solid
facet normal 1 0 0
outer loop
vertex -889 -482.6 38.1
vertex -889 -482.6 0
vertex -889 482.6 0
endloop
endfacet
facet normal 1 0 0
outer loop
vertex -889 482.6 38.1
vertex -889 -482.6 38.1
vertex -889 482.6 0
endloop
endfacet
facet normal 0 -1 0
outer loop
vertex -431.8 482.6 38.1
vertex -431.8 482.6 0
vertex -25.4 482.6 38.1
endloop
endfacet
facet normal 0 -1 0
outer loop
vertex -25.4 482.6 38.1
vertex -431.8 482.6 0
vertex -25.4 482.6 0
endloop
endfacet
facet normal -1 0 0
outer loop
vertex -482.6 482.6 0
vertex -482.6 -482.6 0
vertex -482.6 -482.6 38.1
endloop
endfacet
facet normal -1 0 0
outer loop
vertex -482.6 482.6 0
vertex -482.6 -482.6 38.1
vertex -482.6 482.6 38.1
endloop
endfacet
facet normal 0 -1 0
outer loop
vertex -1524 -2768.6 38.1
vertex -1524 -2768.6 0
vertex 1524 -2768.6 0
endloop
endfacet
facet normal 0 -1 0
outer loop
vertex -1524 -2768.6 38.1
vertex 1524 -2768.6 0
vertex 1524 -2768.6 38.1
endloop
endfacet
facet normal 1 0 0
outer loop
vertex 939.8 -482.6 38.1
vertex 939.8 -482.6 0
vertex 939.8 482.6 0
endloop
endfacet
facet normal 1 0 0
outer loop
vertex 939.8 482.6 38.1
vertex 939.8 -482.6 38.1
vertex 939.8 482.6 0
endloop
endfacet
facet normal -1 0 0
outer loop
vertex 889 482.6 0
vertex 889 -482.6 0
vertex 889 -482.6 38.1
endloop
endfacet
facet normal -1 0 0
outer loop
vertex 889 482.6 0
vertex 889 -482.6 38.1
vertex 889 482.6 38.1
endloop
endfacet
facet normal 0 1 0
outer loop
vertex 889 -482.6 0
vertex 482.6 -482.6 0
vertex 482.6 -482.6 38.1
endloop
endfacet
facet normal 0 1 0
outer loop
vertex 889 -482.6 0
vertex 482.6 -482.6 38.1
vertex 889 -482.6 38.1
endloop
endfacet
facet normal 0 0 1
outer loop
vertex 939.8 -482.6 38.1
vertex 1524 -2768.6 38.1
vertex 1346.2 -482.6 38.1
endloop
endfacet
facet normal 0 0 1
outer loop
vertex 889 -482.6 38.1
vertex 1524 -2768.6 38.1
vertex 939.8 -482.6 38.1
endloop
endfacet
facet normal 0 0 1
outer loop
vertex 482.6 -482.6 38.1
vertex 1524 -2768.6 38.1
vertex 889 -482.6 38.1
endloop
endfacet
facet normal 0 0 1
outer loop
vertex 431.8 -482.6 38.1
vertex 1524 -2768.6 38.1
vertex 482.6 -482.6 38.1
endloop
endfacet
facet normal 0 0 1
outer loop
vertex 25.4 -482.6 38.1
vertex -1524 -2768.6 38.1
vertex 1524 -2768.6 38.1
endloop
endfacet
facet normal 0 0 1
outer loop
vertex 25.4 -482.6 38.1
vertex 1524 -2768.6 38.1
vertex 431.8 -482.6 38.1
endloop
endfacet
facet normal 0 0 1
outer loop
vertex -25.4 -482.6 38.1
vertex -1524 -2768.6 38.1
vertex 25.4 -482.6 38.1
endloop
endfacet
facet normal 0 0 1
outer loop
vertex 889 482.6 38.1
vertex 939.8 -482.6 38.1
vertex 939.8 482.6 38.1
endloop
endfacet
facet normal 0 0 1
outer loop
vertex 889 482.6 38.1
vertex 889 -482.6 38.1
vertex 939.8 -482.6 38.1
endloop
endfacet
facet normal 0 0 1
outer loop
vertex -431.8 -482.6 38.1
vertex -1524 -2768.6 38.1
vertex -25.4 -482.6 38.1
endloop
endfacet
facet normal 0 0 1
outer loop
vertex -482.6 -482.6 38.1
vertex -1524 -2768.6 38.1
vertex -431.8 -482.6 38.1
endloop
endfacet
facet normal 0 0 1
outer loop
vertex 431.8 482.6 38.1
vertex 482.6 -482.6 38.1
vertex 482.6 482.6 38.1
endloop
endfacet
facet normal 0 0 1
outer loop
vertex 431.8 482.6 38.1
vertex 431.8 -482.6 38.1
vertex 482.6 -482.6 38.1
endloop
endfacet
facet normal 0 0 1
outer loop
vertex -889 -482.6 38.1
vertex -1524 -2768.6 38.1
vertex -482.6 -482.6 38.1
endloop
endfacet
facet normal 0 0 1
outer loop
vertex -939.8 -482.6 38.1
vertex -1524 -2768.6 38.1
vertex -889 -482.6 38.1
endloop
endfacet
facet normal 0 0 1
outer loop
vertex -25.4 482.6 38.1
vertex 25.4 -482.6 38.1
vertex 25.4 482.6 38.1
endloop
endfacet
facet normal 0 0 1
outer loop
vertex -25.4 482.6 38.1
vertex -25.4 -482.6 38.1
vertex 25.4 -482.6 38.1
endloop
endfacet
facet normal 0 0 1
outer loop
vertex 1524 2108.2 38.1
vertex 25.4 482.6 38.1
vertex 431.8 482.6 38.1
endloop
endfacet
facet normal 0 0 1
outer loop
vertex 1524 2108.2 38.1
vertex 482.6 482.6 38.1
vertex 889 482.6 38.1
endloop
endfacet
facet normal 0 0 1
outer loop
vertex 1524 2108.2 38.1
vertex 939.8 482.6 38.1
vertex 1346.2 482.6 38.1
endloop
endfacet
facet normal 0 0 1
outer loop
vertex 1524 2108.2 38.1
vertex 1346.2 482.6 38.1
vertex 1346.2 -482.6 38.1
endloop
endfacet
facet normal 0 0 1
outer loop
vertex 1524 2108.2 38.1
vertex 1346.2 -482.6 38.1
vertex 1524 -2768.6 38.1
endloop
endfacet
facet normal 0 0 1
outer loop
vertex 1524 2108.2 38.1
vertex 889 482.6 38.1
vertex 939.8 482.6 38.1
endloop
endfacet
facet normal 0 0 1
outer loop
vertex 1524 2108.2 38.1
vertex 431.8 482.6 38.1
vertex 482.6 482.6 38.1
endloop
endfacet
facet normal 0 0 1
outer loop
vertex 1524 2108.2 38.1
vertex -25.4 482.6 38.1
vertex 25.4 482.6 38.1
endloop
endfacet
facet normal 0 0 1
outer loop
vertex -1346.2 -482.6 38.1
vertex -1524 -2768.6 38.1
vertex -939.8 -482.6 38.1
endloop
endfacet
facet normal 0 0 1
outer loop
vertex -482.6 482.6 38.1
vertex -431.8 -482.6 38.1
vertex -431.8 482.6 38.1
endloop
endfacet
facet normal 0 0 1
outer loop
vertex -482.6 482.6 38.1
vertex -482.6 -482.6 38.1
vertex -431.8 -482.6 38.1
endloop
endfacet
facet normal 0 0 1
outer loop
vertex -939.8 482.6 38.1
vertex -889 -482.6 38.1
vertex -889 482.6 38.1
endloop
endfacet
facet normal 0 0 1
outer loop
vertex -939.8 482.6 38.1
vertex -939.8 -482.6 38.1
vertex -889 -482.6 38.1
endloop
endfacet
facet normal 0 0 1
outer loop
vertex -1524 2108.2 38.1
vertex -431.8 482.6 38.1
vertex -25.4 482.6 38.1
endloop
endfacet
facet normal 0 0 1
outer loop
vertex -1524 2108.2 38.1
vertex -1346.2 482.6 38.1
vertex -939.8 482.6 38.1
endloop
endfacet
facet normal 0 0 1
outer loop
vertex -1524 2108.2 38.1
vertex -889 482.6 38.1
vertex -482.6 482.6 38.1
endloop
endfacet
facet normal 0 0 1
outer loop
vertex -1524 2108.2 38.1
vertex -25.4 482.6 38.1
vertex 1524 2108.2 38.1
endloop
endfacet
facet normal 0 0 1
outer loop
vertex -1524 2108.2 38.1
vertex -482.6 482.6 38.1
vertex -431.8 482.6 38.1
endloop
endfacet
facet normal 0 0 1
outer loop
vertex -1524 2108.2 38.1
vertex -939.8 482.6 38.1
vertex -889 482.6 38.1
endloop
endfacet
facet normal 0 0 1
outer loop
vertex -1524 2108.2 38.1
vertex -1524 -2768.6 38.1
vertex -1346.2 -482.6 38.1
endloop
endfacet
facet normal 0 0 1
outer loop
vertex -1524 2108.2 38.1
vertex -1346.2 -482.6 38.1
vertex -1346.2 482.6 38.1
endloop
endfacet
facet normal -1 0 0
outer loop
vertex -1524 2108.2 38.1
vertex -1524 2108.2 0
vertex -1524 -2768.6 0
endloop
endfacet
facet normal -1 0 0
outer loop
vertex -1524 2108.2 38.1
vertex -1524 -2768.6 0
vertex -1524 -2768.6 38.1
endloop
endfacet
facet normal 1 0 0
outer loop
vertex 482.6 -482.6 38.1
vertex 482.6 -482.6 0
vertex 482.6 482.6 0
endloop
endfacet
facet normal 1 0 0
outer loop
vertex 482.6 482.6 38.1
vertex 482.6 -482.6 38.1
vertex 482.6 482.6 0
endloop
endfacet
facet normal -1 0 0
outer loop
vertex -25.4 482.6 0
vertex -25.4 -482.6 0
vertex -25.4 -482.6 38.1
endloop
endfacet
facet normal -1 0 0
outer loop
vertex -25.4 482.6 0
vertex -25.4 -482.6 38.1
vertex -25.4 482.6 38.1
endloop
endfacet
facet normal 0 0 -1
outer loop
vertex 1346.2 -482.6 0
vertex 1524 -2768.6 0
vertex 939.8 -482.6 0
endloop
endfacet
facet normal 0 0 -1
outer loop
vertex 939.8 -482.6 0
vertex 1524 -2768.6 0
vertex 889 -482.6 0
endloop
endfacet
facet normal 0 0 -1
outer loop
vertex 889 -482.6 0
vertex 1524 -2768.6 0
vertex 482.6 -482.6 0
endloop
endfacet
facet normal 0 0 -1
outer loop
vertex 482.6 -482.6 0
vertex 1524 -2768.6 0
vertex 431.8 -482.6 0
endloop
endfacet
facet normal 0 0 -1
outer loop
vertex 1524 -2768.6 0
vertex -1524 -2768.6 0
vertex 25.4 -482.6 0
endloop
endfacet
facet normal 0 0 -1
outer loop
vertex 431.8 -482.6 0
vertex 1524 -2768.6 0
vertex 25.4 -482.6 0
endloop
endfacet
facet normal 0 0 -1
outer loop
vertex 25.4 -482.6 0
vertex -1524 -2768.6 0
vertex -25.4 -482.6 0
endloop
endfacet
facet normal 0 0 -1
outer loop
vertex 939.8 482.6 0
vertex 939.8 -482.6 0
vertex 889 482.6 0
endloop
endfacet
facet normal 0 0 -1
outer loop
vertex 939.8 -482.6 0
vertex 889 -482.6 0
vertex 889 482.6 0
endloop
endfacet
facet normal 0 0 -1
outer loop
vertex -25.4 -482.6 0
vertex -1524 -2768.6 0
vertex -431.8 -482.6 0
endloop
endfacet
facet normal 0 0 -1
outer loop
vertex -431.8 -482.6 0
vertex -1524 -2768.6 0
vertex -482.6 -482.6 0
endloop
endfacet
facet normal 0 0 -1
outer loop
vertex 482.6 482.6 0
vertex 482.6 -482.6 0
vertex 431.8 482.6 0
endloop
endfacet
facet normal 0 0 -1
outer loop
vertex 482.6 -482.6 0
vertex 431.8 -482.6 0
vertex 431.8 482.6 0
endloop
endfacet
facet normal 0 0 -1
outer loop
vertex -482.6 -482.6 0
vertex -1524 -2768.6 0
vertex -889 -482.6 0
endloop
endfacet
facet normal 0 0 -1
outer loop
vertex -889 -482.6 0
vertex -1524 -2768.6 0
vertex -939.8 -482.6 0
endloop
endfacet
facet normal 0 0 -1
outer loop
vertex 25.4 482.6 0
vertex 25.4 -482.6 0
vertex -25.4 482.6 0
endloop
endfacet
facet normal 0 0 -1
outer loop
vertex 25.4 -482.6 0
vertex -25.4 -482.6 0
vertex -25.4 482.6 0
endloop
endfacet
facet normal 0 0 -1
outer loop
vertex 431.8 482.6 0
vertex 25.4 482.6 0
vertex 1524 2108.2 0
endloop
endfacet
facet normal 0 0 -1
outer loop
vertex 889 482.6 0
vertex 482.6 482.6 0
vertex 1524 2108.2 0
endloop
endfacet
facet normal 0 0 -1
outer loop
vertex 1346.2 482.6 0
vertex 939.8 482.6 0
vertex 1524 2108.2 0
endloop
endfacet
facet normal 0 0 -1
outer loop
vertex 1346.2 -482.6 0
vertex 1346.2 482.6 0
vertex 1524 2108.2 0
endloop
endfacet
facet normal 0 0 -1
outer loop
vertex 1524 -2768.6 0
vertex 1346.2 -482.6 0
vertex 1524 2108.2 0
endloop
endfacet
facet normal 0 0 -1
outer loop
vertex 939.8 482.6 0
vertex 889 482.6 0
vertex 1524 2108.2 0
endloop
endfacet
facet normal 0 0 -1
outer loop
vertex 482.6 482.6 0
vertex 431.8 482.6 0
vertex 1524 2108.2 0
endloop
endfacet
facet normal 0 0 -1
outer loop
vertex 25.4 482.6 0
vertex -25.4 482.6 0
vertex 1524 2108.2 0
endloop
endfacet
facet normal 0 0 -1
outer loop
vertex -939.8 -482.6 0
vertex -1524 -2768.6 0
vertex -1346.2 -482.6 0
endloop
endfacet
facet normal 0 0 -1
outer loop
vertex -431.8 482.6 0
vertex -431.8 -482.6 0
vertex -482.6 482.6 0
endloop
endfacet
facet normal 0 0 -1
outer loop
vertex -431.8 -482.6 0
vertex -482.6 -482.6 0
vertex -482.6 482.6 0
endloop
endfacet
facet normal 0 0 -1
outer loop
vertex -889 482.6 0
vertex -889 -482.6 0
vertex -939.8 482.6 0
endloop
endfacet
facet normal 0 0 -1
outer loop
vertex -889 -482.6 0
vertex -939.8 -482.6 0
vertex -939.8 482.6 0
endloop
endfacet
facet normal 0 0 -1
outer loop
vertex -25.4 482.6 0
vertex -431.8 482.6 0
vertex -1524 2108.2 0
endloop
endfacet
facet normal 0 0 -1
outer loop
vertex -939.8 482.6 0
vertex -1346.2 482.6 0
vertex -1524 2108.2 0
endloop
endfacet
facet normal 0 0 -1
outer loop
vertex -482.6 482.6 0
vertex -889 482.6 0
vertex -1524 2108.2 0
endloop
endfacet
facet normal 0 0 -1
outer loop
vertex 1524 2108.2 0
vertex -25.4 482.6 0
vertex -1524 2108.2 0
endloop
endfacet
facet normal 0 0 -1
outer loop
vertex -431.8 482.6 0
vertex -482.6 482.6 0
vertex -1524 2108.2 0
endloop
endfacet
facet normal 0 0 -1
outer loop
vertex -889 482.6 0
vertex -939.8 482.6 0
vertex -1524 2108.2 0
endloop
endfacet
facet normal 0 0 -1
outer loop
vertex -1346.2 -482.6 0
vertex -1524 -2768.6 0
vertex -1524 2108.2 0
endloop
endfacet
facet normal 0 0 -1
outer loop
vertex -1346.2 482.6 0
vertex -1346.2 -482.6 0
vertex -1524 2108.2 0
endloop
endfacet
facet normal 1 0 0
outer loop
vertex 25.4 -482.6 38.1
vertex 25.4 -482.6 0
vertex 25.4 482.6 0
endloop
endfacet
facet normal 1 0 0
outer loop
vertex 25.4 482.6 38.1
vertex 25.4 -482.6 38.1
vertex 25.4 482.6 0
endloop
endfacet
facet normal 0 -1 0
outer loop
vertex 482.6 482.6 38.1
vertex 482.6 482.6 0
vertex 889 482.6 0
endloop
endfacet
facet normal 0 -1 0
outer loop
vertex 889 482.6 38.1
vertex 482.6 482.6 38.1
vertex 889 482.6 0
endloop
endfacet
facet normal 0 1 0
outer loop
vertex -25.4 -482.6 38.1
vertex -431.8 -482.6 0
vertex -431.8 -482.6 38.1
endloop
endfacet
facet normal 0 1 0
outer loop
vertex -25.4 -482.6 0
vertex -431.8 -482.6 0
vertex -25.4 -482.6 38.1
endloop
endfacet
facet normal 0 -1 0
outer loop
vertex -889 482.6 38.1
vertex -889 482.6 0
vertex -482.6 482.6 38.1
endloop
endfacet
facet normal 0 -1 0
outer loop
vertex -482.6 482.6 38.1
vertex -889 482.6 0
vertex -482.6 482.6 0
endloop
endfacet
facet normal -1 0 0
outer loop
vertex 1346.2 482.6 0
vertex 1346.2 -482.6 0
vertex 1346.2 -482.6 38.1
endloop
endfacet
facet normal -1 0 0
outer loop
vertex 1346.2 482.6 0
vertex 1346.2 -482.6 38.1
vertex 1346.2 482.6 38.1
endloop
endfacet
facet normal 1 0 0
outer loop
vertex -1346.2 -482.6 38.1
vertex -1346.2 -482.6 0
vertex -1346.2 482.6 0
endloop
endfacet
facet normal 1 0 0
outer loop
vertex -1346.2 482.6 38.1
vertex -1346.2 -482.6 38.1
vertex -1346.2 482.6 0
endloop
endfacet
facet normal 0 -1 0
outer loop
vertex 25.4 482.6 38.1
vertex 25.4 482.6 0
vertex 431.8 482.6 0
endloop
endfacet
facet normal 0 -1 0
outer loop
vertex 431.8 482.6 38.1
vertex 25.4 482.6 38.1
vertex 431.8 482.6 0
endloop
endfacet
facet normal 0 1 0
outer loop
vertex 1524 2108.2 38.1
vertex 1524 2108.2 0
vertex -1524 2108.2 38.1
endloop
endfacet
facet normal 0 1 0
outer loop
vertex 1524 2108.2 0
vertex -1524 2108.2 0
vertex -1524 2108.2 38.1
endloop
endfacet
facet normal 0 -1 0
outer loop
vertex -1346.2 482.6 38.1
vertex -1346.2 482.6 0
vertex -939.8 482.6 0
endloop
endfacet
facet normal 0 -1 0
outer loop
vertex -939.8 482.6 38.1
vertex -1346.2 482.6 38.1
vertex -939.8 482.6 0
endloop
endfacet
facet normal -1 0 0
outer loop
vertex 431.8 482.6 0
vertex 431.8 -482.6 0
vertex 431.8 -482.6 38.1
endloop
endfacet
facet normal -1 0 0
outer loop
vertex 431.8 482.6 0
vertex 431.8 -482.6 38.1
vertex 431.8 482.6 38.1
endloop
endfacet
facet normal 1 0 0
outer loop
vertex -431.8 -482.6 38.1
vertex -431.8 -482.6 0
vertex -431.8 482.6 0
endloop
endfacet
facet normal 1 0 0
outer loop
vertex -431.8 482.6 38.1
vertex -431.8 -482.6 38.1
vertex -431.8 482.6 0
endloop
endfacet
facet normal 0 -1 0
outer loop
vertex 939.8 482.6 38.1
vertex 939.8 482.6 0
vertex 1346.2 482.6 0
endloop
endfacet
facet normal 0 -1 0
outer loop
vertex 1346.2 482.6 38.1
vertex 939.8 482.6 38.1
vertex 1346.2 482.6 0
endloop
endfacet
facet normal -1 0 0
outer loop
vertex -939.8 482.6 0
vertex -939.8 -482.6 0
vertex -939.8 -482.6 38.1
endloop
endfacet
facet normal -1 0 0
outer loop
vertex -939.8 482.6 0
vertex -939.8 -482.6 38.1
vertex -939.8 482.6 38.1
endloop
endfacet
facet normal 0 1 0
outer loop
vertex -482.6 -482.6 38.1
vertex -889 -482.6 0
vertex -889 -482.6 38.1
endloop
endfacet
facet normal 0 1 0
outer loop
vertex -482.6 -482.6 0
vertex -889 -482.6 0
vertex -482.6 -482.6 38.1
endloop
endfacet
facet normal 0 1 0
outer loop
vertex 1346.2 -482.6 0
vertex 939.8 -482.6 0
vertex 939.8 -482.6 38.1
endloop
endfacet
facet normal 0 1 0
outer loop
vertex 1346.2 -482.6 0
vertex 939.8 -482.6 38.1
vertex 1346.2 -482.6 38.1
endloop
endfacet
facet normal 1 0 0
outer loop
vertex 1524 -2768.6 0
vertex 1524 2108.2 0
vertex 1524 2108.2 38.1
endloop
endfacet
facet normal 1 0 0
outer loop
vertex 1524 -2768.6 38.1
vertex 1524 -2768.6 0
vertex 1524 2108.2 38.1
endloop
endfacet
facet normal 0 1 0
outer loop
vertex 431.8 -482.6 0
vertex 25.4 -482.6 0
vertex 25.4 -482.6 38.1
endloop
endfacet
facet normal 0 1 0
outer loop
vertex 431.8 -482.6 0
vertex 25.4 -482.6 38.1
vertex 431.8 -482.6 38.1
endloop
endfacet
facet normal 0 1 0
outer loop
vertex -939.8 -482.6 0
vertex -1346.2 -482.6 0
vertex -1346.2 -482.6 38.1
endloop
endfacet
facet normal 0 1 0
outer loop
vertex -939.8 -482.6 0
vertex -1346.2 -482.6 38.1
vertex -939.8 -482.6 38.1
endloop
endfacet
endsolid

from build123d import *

# Parameters (mm, degrees)
SKETCH1_W               = 2743.2
SKETCH1_H               = 1066.8
BOSS_EXTRUDE1_DEPTH     = 38.1
CUT_EXTRUDE1_DEPTH      = 1473.159546381
CUT_EXTRUDE1_DEPTH_BACK = 1473.159546381
SKETCH2_W               = 406.4
SKETCH2_H               = 965.2
SKETCH3_W               = 2743.2
SKETCH3_H               = 38.1
BOSS_EXTRUDE2_DEPTH     = 2235.2
SKETCH4_W               = 2743.2
SKETCH4_H               = 38.1
BOSS_EXTRUDE3_DEPTH     = 1574.8
SKETCH5_W               = 38.1
SKETCH5_H               = 4876.8
BOSS_EXTRUDE4_DEPTH     = 152.4


with BuildPart() as part:
    # Sketch1 → Boss-Extrude1 (new body)
    with BuildSketch(Plane.XY):
        Rectangle(SKETCH1_W, SKETCH1_H)
    extrude(amount=BOSS_EXTRUDE1_DEPTH)

    # Sketch2 → Cut-Extrude1 (cut, two sides: drawn at the far end of the back side and taken through both)
    with BuildSketch(Plane.XY.offset(38.1).offset(-CUT_EXTRUDE1_DEPTH_BACK)):
        with Locations((-1143, 0)):
            Rectangle(SKETCH2_W, SKETCH2_H)
        with Locations((-685.8, 0)):
            Rectangle(SKETCH2_W, SKETCH2_H)
        with Locations((-228.6, 0)):
            Rectangle(SKETCH2_W, SKETCH2_H)
        with Locations((228.6, 0)):
            Rectangle(SKETCH2_W, SKETCH2_H)
        with Locations((685.8, 0)):
            Rectangle(SKETCH2_W, SKETCH2_H)
        with Locations((1143, 0)):
            Rectangle(SKETCH2_W, SKETCH2_H)
    extrude(amount=CUT_EXTRUDE1_DEPTH + CUT_EXTRUDE1_DEPTH_BACK, mode=Mode.SUBTRACT)

    # Sketch3 → Boss-Extrude2 (add)
    with BuildSketch(Plane.XZ.offset(533.4)):
        with Locations((0, 19.05)):
            Rectangle(SKETCH3_W, SKETCH3_H)
    extrude(amount=BOSS_EXTRUDE2_DEPTH)

    # Sketch4 → Boss-Extrude3 (add)
    with BuildSketch(Plane(origin=(0, 533.4, 0), x_dir=(1, 0, 0), z_dir=(0, 1, 0))):
        with Locations((0, -19.05)):
            Rectangle(SKETCH4_W, SKETCH4_H)
    extrude(amount=BOSS_EXTRUDE3_DEPTH)

    # Sketch5 → Boss-Extrude4 (add)
    with BuildSketch(Plane.ZY.offset(1371.6)):
        with Locations((19.05, -330.2)):
            Rectangle(SKETCH5_W, SKETCH5_H)
    boss_extrude4 = extrude(amount=BOSS_EXTRUDE4_DEPTH)

    # Mirror1: Boss-Extrude4 across plane
    add(boss_extrude4.mirror(Plane(origin=(0, 0, 0), x_dir=(0, 0, 1), z_dir=(1, 0, 0))))


solid = part.part
